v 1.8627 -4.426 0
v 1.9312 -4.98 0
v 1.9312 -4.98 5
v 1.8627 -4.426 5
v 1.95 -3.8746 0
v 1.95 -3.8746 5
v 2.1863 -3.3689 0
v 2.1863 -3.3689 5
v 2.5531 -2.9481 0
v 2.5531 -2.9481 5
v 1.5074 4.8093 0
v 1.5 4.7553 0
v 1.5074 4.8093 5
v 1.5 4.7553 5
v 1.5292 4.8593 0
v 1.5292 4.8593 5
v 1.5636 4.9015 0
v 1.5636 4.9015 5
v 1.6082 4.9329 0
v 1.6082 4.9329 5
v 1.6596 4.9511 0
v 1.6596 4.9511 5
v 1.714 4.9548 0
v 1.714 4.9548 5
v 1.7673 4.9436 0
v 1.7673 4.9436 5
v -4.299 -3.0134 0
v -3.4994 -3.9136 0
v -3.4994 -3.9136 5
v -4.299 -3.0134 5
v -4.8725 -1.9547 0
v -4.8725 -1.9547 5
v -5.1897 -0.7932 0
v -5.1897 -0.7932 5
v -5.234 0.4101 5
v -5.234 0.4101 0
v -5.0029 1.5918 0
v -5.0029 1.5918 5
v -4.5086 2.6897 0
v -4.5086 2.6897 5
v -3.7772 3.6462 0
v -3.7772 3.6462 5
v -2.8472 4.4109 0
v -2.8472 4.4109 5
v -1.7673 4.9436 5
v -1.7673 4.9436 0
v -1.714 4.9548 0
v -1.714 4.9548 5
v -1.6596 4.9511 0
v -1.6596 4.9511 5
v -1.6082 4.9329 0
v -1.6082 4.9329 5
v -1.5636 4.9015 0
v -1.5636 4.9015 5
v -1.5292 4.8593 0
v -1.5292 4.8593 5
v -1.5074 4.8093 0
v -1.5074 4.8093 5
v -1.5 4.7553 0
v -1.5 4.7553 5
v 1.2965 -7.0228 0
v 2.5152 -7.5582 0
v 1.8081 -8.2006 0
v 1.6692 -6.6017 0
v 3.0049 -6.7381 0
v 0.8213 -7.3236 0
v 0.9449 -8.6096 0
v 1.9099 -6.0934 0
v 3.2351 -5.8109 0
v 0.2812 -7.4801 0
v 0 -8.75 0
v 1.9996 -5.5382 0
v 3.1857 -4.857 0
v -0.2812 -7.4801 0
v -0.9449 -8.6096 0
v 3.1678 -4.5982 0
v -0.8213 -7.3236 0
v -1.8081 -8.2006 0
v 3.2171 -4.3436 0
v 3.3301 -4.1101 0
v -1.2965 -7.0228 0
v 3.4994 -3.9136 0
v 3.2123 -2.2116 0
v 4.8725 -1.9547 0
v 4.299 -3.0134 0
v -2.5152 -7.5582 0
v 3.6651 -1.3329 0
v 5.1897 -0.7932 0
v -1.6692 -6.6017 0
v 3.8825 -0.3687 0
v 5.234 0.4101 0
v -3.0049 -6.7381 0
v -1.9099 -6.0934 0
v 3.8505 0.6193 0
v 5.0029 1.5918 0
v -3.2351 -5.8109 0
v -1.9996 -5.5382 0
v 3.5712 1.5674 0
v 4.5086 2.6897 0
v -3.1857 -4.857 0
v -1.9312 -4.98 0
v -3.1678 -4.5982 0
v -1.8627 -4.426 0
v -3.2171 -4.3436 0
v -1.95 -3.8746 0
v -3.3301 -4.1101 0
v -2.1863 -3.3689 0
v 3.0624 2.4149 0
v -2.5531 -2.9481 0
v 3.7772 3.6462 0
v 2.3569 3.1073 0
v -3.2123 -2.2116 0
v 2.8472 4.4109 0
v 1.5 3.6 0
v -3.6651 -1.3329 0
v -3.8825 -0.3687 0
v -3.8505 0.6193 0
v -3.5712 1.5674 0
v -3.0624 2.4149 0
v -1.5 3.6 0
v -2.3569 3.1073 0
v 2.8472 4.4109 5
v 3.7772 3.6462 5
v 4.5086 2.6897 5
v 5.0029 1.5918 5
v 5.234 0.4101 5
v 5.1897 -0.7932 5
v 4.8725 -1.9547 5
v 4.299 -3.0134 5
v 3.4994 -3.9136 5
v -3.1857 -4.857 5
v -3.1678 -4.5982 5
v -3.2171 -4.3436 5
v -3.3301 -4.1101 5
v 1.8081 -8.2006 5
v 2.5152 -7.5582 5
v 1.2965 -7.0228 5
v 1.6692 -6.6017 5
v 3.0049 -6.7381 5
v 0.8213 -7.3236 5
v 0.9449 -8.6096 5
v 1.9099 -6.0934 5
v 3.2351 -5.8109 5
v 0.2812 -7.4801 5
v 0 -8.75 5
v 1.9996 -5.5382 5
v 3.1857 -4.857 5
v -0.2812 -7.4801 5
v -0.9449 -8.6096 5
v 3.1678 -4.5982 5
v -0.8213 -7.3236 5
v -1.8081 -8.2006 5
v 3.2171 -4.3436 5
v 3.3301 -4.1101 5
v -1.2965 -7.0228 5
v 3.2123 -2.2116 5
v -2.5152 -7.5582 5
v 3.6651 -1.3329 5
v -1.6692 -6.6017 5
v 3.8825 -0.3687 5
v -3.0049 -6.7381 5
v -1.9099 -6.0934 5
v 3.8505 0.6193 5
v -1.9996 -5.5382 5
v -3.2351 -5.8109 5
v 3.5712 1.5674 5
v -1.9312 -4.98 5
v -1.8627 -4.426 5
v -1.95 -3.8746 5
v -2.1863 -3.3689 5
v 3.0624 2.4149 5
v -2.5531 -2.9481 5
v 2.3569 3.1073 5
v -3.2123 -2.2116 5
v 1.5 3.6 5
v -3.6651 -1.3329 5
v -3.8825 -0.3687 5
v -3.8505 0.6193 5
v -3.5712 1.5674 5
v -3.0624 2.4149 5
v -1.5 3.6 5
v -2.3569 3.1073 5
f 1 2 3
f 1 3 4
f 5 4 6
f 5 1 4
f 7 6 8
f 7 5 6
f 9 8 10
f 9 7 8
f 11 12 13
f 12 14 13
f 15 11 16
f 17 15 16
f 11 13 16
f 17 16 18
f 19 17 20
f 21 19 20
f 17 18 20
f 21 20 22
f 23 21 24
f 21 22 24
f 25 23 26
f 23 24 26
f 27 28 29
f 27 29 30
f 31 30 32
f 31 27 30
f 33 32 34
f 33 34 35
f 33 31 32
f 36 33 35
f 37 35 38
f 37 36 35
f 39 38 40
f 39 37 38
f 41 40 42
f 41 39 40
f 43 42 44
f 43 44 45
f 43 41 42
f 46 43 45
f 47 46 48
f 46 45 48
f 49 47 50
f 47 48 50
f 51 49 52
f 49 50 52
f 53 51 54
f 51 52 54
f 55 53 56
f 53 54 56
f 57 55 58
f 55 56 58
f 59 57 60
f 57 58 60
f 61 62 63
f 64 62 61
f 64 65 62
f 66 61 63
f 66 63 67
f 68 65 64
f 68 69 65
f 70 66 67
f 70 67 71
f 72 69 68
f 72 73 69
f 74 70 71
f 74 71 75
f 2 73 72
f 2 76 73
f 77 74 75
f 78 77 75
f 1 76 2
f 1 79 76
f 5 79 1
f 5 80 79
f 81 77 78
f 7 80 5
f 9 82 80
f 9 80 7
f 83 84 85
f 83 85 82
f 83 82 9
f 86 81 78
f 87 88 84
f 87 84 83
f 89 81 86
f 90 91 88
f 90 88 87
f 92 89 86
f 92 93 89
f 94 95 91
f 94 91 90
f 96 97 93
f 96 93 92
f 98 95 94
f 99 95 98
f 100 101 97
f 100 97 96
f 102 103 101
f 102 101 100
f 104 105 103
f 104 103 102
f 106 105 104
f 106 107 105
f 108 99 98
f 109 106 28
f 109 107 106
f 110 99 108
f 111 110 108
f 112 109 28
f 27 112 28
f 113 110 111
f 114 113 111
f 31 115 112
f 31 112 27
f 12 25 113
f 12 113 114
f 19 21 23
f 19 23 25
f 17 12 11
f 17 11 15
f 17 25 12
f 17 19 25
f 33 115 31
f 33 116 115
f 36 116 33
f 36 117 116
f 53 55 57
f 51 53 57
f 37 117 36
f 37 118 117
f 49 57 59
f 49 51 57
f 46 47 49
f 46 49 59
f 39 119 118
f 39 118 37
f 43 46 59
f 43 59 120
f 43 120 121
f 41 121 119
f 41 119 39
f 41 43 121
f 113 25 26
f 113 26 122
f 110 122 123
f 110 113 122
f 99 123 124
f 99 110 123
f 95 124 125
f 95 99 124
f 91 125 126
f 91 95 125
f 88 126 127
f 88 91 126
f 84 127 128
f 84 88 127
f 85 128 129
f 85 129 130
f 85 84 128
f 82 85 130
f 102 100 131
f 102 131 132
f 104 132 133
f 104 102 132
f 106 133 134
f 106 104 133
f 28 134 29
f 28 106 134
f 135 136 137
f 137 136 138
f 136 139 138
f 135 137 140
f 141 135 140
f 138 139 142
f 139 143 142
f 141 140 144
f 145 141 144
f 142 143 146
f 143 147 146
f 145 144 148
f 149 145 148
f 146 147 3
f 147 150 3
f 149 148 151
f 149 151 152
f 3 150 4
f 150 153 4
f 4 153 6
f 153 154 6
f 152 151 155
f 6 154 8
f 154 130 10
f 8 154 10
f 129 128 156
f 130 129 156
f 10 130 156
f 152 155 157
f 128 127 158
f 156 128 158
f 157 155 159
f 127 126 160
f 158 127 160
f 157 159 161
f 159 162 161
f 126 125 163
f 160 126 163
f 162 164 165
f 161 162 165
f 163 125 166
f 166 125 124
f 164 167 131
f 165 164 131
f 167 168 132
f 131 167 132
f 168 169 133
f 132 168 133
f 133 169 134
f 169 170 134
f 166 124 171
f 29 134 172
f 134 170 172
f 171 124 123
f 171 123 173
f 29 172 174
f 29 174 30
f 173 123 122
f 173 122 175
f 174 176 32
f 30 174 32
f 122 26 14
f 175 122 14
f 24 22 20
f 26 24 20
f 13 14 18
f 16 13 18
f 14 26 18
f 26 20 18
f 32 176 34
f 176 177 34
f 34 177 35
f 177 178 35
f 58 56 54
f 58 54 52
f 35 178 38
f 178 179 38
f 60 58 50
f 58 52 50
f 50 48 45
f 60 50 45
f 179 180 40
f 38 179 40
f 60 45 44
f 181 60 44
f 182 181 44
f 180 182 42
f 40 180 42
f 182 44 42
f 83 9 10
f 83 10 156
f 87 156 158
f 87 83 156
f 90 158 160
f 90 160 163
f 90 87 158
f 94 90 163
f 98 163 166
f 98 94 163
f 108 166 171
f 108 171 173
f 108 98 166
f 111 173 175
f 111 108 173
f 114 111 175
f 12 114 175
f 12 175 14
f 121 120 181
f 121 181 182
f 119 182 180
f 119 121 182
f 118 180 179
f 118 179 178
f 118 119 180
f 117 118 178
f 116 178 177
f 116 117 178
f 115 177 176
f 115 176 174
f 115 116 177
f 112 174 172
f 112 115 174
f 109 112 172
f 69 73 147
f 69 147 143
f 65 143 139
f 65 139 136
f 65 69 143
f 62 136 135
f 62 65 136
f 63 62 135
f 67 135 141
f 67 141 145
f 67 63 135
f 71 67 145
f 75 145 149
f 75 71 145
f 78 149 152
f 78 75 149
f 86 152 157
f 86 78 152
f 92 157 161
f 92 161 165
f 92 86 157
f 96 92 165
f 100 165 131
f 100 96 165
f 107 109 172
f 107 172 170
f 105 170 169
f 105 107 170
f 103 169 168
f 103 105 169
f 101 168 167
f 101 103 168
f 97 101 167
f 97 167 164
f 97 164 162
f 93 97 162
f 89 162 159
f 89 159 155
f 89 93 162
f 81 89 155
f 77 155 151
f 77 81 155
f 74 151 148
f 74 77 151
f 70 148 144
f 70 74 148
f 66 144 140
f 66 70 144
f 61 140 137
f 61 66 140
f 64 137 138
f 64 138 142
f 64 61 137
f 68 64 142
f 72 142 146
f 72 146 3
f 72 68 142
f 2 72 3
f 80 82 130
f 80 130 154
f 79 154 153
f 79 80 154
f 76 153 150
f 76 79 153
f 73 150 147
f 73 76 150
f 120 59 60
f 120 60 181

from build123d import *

# Parameters (mm, degrees)
P_IDAT_VYSUNUT_M1_DEPTH = 5
ZAOBLIT1_R              = 0.2


with BuildPart() as part:
    # Skica1 → Přidat vysunutím1 (new body)
    with BuildSketch(Plane.XY):
        with BuildLine():
            ThreePointArc((-1.931217233, -4.98), (0, -7.5), (1.931217233, -4.98))
            ThreePointArc((1.931217233, -4.98), (1.950012982, -3.874641932), (2.553134647, -2.948135593))
            ThreePointArc((2.553134647, -2.948135593), (3.850518803, 0.619277763), (1.5, 3.6))
            Line((1.5, 3.6), (1.5, 5.031152949))
            ThreePointArc((1.5, 5.031152949), (5.123560056, 1.145265189), (3.49942144, -3.913636364))
            ThreePointArc((3.49942144, -3.913636364), (3.217064036, -4.343555698), (3.185747809, -4.856951872))
            ThreePointArc((3.185747809, -4.856951872), (0, -8.75), (-3.185747809, -4.856951872))
            ThreePointArc((-3.185747809, -4.856951872), (-3.217064036, -4.343555698), (-3.49942144, -3.913636364))
            ThreePointArc((-3.49942144, -3.913636364), (-5.123560056, 1.145265189), (-1.5, 5.031152949))
            Line((-1.5, 5.031152949), (-1.5, 3.6))
            ThreePointArc((-1.5, 3.6), (-3.850518803, 0.619277763), (-2.553134647, -2.948135593))
            ThreePointArc((-2.553134647, -2.948135593), (-1.950012982, -3.874641932), (-1.931217233, -4.98))
        make_face()
    extrude(amount=P_IDAT_VYSUNUT_M1_DEPTH)

    # Zaoblit1
    zaoblit1_edges = [part.edges().sort_by_distance(p)[0] for p in [
        (1.5, 5.031152949, 2.5),
        (-1.5, 5.031152949, 2.5),
    ]]
    fillet(zaoblit1_edges, radius=ZAOBLIT1_R)


solid = part.part
